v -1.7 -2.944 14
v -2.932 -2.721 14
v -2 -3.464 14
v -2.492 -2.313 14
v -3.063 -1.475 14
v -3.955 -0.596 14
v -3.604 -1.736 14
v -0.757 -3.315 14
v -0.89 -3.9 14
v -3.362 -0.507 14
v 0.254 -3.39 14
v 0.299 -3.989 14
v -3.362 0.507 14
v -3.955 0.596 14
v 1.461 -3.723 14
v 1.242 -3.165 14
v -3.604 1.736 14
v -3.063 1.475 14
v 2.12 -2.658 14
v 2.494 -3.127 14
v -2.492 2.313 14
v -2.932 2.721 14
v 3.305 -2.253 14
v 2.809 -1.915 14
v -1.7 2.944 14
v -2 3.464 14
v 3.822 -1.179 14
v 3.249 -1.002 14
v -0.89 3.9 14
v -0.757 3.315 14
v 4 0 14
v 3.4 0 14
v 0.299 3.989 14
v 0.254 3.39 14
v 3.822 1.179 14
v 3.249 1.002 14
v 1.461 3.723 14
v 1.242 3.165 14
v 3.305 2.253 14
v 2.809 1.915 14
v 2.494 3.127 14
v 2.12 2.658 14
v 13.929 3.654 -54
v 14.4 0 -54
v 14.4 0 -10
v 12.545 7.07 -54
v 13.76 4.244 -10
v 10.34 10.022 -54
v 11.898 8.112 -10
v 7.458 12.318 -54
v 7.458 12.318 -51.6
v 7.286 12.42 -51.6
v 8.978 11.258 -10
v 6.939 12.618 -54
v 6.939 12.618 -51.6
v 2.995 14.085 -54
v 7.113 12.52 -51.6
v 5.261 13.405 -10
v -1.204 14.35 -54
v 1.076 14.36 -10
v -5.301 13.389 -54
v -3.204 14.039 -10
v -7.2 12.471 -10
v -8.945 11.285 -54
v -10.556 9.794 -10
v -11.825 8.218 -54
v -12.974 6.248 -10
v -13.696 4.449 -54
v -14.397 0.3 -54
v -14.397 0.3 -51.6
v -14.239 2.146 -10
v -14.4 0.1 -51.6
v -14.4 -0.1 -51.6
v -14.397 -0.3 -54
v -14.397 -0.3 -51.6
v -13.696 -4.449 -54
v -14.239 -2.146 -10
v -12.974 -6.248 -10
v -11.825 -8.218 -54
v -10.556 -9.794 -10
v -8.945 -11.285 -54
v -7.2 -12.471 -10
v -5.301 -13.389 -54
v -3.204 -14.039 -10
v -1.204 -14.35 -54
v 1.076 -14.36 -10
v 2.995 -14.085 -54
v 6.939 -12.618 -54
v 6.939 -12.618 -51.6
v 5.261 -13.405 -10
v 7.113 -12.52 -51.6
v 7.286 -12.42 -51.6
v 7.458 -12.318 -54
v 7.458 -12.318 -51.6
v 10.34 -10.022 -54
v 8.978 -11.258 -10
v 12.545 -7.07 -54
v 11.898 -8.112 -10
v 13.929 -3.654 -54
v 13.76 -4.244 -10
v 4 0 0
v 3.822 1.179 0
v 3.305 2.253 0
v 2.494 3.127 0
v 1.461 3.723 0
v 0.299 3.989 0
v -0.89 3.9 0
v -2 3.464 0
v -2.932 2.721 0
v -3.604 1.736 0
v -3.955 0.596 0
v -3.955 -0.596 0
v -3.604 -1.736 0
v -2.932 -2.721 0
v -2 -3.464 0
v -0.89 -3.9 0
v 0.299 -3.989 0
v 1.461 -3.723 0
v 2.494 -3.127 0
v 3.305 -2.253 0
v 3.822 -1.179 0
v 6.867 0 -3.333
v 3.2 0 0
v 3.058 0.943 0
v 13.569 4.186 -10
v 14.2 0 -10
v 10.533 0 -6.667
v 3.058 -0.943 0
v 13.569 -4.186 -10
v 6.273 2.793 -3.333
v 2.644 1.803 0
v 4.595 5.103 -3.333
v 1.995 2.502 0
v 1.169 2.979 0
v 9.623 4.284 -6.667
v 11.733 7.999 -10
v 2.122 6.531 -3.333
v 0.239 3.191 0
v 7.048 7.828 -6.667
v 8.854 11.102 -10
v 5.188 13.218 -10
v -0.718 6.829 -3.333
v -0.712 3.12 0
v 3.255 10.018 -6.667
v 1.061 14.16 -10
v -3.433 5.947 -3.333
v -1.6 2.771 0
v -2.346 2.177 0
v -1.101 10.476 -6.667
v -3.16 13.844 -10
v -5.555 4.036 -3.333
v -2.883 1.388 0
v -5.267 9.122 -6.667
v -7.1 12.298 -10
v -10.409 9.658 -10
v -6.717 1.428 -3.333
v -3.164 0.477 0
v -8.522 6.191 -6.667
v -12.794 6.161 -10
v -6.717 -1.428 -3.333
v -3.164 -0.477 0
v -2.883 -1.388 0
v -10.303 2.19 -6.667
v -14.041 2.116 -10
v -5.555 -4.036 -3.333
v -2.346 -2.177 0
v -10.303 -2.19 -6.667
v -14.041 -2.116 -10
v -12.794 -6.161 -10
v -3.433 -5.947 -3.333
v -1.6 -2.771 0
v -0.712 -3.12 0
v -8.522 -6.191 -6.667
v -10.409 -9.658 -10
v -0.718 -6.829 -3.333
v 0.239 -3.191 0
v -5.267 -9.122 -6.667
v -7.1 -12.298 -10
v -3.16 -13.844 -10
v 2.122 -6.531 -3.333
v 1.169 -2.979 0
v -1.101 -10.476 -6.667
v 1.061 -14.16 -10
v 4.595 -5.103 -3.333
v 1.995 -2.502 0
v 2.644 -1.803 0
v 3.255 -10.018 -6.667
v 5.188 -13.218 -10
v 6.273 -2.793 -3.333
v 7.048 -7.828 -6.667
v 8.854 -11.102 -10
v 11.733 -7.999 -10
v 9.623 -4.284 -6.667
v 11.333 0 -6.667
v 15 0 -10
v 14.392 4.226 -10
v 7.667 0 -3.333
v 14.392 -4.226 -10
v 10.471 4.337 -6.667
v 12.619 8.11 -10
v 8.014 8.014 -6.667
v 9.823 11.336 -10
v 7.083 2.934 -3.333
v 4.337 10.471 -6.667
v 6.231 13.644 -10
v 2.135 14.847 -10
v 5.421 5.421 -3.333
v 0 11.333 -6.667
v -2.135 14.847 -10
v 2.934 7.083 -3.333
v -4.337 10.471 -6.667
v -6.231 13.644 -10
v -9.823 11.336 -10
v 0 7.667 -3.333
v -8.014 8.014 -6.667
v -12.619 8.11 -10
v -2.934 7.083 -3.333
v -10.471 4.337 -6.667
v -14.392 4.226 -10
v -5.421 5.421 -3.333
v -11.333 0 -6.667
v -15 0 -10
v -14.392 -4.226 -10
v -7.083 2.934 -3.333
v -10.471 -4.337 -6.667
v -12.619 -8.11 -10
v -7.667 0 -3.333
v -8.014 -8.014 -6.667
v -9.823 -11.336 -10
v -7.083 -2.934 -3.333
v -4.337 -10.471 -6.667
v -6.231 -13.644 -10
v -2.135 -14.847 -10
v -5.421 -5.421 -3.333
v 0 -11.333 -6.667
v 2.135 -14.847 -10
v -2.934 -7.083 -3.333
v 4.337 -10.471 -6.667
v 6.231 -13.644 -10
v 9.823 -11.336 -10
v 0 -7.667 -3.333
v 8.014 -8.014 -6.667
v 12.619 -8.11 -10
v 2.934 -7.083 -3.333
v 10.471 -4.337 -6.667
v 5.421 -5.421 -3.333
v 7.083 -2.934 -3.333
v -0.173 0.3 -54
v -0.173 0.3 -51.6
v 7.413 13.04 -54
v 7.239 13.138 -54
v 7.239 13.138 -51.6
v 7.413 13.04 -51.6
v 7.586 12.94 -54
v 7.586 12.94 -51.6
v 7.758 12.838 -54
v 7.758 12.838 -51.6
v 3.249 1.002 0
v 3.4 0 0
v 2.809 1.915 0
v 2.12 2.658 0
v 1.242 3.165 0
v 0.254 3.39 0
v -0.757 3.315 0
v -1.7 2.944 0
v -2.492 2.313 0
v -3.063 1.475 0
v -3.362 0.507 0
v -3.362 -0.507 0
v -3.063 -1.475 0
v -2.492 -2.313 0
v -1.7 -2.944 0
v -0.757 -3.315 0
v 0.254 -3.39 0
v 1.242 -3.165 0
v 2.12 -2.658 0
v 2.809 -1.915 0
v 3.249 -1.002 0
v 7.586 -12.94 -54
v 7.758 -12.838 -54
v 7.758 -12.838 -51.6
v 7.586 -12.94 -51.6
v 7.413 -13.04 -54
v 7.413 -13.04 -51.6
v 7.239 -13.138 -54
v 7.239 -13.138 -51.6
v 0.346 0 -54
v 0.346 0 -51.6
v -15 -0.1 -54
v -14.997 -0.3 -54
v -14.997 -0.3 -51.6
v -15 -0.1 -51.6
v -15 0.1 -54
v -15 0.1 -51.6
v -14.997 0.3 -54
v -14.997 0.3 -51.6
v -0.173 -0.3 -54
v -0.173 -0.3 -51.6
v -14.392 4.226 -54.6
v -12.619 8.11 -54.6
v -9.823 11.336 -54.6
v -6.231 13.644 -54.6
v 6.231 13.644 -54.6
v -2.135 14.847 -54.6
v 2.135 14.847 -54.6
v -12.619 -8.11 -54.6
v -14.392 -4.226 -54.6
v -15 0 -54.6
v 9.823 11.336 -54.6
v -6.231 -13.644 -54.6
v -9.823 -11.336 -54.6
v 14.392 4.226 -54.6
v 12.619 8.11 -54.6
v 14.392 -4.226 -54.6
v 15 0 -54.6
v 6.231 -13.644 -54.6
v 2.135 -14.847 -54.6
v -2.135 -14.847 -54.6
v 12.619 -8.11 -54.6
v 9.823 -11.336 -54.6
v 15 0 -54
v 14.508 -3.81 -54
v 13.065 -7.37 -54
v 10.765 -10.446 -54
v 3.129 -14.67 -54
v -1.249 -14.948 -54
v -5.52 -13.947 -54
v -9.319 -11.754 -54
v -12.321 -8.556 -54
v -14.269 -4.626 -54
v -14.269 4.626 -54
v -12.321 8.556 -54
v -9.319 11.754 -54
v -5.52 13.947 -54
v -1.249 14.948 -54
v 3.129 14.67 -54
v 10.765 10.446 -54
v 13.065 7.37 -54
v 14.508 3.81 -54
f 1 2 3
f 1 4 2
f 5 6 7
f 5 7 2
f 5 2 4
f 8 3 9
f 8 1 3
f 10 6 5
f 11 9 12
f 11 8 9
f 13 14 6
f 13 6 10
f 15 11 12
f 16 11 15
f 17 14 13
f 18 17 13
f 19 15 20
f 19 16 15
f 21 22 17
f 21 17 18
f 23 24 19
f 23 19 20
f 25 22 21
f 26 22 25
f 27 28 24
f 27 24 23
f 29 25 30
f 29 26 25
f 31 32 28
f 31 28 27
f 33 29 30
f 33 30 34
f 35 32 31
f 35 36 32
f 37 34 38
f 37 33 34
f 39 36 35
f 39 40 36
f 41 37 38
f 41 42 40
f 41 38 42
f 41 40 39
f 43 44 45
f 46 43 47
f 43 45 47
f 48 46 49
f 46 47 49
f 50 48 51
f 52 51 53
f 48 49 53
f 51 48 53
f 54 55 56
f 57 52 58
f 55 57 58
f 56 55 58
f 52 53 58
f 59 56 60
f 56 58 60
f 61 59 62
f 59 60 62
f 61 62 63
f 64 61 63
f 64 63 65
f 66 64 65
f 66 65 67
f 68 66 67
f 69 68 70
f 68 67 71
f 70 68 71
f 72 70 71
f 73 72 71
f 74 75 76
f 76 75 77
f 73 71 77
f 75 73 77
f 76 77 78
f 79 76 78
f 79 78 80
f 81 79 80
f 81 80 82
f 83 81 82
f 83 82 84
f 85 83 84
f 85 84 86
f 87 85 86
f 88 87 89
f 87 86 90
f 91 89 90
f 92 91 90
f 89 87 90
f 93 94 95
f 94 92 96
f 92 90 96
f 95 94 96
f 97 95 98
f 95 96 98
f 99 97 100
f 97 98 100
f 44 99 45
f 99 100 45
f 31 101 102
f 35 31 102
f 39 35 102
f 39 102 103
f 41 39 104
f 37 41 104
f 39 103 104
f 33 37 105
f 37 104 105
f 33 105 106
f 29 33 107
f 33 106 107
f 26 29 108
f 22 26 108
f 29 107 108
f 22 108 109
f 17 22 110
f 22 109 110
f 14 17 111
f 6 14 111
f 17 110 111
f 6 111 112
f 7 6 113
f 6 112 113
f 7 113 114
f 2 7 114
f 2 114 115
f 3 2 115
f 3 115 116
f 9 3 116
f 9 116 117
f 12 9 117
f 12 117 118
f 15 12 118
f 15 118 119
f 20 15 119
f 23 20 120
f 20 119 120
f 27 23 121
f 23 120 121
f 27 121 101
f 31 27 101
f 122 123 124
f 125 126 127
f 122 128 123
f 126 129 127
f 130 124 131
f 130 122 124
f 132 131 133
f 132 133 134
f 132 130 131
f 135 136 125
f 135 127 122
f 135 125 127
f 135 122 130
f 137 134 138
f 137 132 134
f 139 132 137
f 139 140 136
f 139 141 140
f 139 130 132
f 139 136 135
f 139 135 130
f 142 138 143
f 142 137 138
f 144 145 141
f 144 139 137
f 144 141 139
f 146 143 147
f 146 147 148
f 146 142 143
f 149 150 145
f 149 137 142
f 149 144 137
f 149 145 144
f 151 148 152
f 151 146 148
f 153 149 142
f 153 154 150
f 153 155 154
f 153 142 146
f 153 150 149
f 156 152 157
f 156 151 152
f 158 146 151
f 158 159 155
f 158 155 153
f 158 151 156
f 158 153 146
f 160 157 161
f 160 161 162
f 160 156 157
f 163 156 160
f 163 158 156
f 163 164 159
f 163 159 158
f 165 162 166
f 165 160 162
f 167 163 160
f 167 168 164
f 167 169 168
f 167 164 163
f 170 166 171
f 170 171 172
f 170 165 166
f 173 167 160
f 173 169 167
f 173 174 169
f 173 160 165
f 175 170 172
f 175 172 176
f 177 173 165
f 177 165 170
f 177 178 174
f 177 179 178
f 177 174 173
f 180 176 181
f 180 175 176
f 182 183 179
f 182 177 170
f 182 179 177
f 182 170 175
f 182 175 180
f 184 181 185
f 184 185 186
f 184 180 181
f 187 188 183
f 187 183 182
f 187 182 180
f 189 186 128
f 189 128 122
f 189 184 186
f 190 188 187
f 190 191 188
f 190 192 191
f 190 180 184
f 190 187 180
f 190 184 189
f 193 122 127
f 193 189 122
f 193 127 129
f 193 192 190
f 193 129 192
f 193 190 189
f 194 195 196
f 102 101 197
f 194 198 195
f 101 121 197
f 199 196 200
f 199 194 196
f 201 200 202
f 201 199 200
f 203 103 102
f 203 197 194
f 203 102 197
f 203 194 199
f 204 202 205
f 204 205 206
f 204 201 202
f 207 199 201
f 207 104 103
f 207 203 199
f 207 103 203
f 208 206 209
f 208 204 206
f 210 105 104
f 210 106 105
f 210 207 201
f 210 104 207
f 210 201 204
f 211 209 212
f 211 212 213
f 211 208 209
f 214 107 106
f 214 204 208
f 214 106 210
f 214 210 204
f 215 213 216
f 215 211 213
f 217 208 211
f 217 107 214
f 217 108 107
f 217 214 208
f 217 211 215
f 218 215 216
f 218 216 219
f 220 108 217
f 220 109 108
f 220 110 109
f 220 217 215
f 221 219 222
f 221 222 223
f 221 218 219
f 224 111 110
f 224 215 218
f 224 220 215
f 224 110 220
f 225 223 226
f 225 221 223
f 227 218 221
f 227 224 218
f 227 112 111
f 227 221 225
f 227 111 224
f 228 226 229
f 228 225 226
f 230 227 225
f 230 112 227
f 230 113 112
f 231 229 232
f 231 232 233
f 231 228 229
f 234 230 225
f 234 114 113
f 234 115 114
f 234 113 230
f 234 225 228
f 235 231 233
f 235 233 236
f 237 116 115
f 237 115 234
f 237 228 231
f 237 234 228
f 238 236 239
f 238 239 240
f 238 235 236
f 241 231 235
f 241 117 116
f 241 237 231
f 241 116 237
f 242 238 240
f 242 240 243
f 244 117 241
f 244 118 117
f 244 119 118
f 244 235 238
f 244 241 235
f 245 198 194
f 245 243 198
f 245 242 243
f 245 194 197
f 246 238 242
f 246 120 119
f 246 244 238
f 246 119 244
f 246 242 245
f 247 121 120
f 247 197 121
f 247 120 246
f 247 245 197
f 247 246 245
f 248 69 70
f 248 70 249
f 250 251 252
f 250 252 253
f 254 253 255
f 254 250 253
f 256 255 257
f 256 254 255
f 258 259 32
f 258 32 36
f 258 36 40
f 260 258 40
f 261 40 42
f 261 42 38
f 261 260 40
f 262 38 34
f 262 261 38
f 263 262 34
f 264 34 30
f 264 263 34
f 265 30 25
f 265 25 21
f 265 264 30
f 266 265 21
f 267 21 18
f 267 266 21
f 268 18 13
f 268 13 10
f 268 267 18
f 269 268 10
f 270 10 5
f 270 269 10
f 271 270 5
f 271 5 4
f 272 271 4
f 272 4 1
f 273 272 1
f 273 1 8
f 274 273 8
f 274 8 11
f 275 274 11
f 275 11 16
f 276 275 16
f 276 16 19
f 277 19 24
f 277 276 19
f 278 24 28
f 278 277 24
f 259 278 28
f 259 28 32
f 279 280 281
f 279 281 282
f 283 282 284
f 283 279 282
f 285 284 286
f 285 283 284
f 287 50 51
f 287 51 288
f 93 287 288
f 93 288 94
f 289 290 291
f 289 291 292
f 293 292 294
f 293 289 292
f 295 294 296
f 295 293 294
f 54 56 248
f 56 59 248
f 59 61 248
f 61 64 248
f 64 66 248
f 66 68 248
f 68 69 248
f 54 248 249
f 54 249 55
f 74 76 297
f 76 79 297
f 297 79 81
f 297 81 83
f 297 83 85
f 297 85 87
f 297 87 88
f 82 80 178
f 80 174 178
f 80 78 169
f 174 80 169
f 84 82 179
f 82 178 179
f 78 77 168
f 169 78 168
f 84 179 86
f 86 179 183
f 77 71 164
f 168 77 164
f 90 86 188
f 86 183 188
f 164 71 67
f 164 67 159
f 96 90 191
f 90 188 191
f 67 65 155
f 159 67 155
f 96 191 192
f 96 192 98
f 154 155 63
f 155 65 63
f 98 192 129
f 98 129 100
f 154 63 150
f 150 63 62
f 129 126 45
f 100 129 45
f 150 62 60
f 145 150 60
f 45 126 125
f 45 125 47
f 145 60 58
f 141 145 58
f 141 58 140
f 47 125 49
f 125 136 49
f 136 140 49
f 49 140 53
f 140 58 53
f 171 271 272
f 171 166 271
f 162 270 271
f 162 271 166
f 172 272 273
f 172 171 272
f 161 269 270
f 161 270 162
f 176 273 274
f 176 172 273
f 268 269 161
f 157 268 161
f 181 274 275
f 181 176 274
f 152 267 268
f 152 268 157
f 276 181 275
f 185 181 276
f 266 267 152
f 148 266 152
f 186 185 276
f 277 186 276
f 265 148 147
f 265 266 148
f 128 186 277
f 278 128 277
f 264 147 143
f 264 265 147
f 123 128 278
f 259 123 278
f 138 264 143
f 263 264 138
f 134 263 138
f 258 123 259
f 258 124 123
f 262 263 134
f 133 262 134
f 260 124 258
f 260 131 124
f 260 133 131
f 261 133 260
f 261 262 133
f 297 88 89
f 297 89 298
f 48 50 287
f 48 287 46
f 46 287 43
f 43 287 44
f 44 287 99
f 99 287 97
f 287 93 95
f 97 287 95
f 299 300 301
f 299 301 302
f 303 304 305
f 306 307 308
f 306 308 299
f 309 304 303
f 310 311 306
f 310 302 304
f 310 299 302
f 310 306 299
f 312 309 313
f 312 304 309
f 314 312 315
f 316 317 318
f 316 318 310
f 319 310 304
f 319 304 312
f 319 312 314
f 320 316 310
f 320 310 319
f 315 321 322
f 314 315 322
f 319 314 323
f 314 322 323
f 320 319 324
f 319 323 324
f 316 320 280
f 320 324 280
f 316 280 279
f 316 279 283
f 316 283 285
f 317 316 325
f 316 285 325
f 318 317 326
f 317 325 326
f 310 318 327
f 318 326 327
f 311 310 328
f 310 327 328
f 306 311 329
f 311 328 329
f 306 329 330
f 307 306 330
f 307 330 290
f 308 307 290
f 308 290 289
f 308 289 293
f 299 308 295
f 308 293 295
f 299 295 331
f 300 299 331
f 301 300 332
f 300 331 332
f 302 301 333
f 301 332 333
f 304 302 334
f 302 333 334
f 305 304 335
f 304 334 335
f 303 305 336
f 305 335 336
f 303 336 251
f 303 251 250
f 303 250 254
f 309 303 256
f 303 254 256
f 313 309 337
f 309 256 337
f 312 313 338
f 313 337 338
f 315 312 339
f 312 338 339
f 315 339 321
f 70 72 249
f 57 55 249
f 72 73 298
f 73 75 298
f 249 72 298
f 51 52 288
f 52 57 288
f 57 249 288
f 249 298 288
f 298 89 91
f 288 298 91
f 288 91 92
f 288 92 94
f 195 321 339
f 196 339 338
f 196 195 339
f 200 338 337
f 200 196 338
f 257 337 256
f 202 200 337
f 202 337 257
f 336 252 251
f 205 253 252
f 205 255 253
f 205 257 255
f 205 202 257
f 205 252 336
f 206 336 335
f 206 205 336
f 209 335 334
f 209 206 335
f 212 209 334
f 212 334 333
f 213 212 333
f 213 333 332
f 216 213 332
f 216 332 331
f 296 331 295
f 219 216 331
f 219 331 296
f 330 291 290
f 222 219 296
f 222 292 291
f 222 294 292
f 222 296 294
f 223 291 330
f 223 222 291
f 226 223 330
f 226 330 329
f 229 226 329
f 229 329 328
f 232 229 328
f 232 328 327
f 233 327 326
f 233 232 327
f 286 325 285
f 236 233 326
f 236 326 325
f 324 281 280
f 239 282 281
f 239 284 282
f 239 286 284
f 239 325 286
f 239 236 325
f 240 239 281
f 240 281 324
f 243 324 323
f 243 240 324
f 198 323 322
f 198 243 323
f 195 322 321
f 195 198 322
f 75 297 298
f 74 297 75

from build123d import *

# Parameters (mm, degrees)
F2_R      = 4
F2_R_2    = 3.4
F5_DEPTH  = 14
F7_R      = 15
F3_R      = 4
F4_R      = 3.2
F8_R      = 14.2
F6_R      = 15
F6_R_2    = 14.4
F11_DEPTH = 44
F14_DEPTH = 2.4
F15_R     = 15
F16_DEPTH = 0.6


with BuildPart() as f5:
    # F2 (on Top) → F5 (new body)
    with BuildSketch(Plane.XY):
        Circle(F2_R)
        Circle(F2_R_2, mode=Mode.SUBTRACT)
    extrude(amount=F5_DEPTH)

    # F7 (on offset) → F9 section 0
    with BuildSketch(Plane.XY.offset(-10)):
        Circle(F7_R)
    # F3 (on Top) → F9 section 1
    with BuildSketch(Plane.XY):
        Circle(F3_R)
    loft()

    # F4 (on Top) → F10 section 0
    with BuildSketch(Plane.XY):
        Circle(F4_R)
    # F8 (on offset) → F10 section 1
    with BuildSketch(Plane.XY.offset(-10)):
        Circle(F8_R)
    loft(mode=Mode.SUBTRACT)

    # F6 (on offset) → F11 (join)
    with BuildSketch(Plane.XY.offset(-10)):
        Circle(F6_R)
        Circle(F6_R_2, mode=Mode.SUBTRACT)
    extrude(amount=-F11_DEPTH)

    # F13 (on offset) → F14 (join)
    with BuildSketch(Plane(origin=(0, 0, -54), x_dir=(1, 0, 0), z_dir=(0, 0, -1))):
        with BuildLine():
            Line((0.3464101615, 0), (7.7583074711, 12.8377827207))
            ThreePointArc((7.7583074711, 12.8377827207), (7.5, 12.9903810568), (7.2386922288, 13.1377827207))
            Line((7.2386922288, 13.1377827207), (-0.1732050808, 0.3))
            Line((-0.1732050808, 0.3), (-14.9969996999, 0.3))
            ThreePointArc((-14.9969996999, 0.3), (-15, 0), (-14.9969996999, -0.3))
            Line((-14.9969996999, -0.3), (-0.1732050808, -0.3))
            Line((-0.1732050808, -0.3), (7.2386922288, -13.1377827207))
            ThreePointArc((7.2386922288, -13.1377827207), (7.5, -12.9903810568), (7.7583074711, -12.8377827207))
            Line((7.7583074711, -12.8377827207), (0.3464101615, 0))
        make_face()
    extrude(amount=-F14_DEPTH)

    # F15 (on offset) → F16 (join)
    with BuildSketch(Plane(origin=(0, 0, -54), x_dir=(1, 0, 0), z_dir=(0, 0, -1))):
        Circle(F15_R)
    extrude(amount=F16_DEPTH)


solid = f5.part
